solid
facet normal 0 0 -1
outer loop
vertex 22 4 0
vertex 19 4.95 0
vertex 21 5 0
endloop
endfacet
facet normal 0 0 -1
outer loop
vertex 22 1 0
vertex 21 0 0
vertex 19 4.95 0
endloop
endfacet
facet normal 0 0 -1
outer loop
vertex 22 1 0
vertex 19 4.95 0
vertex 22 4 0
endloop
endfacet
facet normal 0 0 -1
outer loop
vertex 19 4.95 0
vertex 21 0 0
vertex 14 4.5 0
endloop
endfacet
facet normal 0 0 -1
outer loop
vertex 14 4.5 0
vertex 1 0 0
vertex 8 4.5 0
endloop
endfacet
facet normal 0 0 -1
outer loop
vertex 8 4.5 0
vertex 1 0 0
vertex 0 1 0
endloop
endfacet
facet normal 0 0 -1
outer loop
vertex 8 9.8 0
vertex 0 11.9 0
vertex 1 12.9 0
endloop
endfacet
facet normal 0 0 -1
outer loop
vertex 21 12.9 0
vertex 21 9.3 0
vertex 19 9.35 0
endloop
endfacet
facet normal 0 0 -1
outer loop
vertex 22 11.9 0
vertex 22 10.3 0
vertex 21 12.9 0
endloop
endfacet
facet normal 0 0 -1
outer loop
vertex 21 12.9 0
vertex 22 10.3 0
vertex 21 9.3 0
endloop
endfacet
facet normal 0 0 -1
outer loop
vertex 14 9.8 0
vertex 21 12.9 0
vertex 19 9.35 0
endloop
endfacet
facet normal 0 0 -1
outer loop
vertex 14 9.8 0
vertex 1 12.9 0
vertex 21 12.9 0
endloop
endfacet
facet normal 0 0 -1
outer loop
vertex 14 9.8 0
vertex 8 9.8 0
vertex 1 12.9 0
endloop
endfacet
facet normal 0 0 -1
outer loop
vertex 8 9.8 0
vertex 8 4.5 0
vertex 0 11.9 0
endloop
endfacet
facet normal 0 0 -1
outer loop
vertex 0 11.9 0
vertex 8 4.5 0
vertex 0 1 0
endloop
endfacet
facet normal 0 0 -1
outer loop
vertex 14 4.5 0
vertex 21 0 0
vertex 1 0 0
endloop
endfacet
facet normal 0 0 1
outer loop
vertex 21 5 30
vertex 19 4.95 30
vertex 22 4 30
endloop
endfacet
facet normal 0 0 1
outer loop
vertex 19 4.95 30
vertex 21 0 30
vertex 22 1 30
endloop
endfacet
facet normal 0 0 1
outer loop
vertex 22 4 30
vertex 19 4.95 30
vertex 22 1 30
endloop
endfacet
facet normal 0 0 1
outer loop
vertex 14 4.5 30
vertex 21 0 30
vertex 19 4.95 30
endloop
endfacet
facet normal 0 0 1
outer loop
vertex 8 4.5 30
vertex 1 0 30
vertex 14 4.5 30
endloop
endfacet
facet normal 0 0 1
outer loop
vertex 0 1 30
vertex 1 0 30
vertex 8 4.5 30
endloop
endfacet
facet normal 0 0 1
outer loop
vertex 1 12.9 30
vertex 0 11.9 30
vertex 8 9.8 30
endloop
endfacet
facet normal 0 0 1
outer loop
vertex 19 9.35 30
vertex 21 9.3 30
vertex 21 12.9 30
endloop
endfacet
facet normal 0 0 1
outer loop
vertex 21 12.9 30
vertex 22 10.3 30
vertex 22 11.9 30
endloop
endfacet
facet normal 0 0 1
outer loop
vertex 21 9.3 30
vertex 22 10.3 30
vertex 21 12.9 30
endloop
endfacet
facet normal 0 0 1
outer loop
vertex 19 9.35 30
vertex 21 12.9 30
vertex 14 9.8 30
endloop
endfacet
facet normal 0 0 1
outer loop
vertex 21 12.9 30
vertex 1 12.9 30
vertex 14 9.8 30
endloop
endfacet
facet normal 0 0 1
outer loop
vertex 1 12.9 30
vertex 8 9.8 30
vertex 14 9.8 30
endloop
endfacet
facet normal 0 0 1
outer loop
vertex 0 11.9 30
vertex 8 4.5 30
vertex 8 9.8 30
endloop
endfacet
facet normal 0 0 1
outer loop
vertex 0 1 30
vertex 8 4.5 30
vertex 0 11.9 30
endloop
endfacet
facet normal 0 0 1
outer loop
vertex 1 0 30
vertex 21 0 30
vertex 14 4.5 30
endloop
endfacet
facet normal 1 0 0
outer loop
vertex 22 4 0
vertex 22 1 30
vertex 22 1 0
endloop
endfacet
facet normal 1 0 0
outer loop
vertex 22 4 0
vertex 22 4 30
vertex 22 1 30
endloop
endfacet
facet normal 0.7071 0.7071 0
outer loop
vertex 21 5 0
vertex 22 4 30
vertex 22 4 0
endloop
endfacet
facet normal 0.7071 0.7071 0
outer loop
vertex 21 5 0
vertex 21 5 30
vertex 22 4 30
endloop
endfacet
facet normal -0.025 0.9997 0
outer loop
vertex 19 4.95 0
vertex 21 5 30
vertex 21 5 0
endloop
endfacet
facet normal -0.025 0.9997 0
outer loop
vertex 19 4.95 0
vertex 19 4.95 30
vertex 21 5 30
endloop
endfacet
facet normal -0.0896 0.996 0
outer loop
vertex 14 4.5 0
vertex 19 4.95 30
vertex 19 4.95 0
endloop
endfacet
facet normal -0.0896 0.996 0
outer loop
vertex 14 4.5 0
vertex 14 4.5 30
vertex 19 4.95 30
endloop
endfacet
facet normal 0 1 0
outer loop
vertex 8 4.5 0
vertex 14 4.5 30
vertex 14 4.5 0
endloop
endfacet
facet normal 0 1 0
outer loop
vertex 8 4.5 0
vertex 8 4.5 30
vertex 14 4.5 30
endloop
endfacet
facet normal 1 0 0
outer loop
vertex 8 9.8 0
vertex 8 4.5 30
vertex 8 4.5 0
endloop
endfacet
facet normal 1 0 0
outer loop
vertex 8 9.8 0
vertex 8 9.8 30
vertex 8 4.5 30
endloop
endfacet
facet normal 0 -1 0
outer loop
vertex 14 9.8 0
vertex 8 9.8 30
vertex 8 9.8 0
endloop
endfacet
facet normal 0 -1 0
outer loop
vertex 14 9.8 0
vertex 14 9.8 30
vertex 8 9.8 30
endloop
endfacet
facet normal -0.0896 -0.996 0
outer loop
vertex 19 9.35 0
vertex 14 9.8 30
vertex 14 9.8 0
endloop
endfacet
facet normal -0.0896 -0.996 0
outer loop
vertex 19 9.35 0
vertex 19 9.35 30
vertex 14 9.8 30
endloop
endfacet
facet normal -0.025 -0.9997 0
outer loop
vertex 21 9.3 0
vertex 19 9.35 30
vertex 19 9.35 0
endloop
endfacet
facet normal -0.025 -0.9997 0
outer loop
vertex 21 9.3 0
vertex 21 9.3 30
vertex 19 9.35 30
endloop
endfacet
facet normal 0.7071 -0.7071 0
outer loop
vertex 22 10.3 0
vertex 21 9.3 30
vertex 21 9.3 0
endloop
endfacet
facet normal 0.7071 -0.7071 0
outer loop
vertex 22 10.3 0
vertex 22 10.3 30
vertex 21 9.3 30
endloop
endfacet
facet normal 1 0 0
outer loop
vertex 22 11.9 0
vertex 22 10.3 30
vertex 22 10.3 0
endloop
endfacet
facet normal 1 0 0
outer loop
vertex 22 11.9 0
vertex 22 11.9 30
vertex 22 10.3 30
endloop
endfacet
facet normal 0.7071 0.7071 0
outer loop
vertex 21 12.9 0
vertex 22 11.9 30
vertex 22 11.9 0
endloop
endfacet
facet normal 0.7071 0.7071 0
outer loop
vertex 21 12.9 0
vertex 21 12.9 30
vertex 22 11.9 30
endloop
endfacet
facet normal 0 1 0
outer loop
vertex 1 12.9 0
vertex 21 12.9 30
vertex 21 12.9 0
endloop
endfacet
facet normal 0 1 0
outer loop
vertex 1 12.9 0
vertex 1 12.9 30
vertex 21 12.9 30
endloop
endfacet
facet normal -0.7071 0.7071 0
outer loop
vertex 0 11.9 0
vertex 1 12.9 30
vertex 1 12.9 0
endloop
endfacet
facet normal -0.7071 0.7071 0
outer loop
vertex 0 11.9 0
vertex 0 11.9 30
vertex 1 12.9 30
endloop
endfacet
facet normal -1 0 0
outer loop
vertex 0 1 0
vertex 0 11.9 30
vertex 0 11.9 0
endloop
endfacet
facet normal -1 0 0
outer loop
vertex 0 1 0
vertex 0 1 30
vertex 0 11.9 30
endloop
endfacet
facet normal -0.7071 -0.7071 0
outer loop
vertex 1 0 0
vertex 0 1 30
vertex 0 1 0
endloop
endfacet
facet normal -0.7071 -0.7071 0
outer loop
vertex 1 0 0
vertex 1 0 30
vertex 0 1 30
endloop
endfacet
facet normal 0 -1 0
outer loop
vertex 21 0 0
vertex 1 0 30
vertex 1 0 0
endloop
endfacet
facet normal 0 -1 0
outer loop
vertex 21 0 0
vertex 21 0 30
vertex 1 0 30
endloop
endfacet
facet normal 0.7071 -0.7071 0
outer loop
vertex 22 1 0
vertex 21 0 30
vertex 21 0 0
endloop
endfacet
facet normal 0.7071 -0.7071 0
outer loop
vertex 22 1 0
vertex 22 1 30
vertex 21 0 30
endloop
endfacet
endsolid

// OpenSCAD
//DIe Laenge der Klammer
laenge=30;

//Weite der Basis
wbase=8;
//Weite des Arms oben (der Druckpunkt liegt etwas zurück)
warmtop=14;
//Weite des Arms unten
warmbottom=14;

// Betthoehe (der Druck muss selbst eingerechnet werden zB 0.6 abziehen)
hbed=4.3;   
//Hoehe Arm oben (mehr als 4 geht beim Mendel90 nicht)
harmtop=3.6; 
//Hoehe Arm unten
harmbottom=5;

hall=hbed+harmtop+harmbottom;

	      	linear_extrude(height=laenge)
		      polygon(
		         points=[[0,1],
                       [0,hall-1],
                       [1,hall],
                       [wbase,hall],
                       [wbase+warmtop-1,hall],
                       [wbase+warmtop,hall-1],
                       [wbase+warmtop,hall-harmtop+1],
                       [wbase+warmtop-1,hall-harmtop],
                       [wbase+warmtop-3,hall-harmtop+0.05],
                       [wbase+warmtop-8,hall-harmtop+0.5],
                       [wbase,hall-harmtop+0.5],
                       
                       [wbase,harmbottom-0.5],
                       [wbase+warmbottom-8,harmbottom-0.5],
                       [wbase+warmbottom-3,harmbottom-0.05],
                       [wbase+warmbottom-1,harmbottom],
                       [wbase+warmbottom,harmbottom-1],
                       [wbase+warmbottom,1],
                       [wbase+warmbottom-1,0],
                       [wbase,0],
                       [1,0]
                       
                       ] 
                   );
